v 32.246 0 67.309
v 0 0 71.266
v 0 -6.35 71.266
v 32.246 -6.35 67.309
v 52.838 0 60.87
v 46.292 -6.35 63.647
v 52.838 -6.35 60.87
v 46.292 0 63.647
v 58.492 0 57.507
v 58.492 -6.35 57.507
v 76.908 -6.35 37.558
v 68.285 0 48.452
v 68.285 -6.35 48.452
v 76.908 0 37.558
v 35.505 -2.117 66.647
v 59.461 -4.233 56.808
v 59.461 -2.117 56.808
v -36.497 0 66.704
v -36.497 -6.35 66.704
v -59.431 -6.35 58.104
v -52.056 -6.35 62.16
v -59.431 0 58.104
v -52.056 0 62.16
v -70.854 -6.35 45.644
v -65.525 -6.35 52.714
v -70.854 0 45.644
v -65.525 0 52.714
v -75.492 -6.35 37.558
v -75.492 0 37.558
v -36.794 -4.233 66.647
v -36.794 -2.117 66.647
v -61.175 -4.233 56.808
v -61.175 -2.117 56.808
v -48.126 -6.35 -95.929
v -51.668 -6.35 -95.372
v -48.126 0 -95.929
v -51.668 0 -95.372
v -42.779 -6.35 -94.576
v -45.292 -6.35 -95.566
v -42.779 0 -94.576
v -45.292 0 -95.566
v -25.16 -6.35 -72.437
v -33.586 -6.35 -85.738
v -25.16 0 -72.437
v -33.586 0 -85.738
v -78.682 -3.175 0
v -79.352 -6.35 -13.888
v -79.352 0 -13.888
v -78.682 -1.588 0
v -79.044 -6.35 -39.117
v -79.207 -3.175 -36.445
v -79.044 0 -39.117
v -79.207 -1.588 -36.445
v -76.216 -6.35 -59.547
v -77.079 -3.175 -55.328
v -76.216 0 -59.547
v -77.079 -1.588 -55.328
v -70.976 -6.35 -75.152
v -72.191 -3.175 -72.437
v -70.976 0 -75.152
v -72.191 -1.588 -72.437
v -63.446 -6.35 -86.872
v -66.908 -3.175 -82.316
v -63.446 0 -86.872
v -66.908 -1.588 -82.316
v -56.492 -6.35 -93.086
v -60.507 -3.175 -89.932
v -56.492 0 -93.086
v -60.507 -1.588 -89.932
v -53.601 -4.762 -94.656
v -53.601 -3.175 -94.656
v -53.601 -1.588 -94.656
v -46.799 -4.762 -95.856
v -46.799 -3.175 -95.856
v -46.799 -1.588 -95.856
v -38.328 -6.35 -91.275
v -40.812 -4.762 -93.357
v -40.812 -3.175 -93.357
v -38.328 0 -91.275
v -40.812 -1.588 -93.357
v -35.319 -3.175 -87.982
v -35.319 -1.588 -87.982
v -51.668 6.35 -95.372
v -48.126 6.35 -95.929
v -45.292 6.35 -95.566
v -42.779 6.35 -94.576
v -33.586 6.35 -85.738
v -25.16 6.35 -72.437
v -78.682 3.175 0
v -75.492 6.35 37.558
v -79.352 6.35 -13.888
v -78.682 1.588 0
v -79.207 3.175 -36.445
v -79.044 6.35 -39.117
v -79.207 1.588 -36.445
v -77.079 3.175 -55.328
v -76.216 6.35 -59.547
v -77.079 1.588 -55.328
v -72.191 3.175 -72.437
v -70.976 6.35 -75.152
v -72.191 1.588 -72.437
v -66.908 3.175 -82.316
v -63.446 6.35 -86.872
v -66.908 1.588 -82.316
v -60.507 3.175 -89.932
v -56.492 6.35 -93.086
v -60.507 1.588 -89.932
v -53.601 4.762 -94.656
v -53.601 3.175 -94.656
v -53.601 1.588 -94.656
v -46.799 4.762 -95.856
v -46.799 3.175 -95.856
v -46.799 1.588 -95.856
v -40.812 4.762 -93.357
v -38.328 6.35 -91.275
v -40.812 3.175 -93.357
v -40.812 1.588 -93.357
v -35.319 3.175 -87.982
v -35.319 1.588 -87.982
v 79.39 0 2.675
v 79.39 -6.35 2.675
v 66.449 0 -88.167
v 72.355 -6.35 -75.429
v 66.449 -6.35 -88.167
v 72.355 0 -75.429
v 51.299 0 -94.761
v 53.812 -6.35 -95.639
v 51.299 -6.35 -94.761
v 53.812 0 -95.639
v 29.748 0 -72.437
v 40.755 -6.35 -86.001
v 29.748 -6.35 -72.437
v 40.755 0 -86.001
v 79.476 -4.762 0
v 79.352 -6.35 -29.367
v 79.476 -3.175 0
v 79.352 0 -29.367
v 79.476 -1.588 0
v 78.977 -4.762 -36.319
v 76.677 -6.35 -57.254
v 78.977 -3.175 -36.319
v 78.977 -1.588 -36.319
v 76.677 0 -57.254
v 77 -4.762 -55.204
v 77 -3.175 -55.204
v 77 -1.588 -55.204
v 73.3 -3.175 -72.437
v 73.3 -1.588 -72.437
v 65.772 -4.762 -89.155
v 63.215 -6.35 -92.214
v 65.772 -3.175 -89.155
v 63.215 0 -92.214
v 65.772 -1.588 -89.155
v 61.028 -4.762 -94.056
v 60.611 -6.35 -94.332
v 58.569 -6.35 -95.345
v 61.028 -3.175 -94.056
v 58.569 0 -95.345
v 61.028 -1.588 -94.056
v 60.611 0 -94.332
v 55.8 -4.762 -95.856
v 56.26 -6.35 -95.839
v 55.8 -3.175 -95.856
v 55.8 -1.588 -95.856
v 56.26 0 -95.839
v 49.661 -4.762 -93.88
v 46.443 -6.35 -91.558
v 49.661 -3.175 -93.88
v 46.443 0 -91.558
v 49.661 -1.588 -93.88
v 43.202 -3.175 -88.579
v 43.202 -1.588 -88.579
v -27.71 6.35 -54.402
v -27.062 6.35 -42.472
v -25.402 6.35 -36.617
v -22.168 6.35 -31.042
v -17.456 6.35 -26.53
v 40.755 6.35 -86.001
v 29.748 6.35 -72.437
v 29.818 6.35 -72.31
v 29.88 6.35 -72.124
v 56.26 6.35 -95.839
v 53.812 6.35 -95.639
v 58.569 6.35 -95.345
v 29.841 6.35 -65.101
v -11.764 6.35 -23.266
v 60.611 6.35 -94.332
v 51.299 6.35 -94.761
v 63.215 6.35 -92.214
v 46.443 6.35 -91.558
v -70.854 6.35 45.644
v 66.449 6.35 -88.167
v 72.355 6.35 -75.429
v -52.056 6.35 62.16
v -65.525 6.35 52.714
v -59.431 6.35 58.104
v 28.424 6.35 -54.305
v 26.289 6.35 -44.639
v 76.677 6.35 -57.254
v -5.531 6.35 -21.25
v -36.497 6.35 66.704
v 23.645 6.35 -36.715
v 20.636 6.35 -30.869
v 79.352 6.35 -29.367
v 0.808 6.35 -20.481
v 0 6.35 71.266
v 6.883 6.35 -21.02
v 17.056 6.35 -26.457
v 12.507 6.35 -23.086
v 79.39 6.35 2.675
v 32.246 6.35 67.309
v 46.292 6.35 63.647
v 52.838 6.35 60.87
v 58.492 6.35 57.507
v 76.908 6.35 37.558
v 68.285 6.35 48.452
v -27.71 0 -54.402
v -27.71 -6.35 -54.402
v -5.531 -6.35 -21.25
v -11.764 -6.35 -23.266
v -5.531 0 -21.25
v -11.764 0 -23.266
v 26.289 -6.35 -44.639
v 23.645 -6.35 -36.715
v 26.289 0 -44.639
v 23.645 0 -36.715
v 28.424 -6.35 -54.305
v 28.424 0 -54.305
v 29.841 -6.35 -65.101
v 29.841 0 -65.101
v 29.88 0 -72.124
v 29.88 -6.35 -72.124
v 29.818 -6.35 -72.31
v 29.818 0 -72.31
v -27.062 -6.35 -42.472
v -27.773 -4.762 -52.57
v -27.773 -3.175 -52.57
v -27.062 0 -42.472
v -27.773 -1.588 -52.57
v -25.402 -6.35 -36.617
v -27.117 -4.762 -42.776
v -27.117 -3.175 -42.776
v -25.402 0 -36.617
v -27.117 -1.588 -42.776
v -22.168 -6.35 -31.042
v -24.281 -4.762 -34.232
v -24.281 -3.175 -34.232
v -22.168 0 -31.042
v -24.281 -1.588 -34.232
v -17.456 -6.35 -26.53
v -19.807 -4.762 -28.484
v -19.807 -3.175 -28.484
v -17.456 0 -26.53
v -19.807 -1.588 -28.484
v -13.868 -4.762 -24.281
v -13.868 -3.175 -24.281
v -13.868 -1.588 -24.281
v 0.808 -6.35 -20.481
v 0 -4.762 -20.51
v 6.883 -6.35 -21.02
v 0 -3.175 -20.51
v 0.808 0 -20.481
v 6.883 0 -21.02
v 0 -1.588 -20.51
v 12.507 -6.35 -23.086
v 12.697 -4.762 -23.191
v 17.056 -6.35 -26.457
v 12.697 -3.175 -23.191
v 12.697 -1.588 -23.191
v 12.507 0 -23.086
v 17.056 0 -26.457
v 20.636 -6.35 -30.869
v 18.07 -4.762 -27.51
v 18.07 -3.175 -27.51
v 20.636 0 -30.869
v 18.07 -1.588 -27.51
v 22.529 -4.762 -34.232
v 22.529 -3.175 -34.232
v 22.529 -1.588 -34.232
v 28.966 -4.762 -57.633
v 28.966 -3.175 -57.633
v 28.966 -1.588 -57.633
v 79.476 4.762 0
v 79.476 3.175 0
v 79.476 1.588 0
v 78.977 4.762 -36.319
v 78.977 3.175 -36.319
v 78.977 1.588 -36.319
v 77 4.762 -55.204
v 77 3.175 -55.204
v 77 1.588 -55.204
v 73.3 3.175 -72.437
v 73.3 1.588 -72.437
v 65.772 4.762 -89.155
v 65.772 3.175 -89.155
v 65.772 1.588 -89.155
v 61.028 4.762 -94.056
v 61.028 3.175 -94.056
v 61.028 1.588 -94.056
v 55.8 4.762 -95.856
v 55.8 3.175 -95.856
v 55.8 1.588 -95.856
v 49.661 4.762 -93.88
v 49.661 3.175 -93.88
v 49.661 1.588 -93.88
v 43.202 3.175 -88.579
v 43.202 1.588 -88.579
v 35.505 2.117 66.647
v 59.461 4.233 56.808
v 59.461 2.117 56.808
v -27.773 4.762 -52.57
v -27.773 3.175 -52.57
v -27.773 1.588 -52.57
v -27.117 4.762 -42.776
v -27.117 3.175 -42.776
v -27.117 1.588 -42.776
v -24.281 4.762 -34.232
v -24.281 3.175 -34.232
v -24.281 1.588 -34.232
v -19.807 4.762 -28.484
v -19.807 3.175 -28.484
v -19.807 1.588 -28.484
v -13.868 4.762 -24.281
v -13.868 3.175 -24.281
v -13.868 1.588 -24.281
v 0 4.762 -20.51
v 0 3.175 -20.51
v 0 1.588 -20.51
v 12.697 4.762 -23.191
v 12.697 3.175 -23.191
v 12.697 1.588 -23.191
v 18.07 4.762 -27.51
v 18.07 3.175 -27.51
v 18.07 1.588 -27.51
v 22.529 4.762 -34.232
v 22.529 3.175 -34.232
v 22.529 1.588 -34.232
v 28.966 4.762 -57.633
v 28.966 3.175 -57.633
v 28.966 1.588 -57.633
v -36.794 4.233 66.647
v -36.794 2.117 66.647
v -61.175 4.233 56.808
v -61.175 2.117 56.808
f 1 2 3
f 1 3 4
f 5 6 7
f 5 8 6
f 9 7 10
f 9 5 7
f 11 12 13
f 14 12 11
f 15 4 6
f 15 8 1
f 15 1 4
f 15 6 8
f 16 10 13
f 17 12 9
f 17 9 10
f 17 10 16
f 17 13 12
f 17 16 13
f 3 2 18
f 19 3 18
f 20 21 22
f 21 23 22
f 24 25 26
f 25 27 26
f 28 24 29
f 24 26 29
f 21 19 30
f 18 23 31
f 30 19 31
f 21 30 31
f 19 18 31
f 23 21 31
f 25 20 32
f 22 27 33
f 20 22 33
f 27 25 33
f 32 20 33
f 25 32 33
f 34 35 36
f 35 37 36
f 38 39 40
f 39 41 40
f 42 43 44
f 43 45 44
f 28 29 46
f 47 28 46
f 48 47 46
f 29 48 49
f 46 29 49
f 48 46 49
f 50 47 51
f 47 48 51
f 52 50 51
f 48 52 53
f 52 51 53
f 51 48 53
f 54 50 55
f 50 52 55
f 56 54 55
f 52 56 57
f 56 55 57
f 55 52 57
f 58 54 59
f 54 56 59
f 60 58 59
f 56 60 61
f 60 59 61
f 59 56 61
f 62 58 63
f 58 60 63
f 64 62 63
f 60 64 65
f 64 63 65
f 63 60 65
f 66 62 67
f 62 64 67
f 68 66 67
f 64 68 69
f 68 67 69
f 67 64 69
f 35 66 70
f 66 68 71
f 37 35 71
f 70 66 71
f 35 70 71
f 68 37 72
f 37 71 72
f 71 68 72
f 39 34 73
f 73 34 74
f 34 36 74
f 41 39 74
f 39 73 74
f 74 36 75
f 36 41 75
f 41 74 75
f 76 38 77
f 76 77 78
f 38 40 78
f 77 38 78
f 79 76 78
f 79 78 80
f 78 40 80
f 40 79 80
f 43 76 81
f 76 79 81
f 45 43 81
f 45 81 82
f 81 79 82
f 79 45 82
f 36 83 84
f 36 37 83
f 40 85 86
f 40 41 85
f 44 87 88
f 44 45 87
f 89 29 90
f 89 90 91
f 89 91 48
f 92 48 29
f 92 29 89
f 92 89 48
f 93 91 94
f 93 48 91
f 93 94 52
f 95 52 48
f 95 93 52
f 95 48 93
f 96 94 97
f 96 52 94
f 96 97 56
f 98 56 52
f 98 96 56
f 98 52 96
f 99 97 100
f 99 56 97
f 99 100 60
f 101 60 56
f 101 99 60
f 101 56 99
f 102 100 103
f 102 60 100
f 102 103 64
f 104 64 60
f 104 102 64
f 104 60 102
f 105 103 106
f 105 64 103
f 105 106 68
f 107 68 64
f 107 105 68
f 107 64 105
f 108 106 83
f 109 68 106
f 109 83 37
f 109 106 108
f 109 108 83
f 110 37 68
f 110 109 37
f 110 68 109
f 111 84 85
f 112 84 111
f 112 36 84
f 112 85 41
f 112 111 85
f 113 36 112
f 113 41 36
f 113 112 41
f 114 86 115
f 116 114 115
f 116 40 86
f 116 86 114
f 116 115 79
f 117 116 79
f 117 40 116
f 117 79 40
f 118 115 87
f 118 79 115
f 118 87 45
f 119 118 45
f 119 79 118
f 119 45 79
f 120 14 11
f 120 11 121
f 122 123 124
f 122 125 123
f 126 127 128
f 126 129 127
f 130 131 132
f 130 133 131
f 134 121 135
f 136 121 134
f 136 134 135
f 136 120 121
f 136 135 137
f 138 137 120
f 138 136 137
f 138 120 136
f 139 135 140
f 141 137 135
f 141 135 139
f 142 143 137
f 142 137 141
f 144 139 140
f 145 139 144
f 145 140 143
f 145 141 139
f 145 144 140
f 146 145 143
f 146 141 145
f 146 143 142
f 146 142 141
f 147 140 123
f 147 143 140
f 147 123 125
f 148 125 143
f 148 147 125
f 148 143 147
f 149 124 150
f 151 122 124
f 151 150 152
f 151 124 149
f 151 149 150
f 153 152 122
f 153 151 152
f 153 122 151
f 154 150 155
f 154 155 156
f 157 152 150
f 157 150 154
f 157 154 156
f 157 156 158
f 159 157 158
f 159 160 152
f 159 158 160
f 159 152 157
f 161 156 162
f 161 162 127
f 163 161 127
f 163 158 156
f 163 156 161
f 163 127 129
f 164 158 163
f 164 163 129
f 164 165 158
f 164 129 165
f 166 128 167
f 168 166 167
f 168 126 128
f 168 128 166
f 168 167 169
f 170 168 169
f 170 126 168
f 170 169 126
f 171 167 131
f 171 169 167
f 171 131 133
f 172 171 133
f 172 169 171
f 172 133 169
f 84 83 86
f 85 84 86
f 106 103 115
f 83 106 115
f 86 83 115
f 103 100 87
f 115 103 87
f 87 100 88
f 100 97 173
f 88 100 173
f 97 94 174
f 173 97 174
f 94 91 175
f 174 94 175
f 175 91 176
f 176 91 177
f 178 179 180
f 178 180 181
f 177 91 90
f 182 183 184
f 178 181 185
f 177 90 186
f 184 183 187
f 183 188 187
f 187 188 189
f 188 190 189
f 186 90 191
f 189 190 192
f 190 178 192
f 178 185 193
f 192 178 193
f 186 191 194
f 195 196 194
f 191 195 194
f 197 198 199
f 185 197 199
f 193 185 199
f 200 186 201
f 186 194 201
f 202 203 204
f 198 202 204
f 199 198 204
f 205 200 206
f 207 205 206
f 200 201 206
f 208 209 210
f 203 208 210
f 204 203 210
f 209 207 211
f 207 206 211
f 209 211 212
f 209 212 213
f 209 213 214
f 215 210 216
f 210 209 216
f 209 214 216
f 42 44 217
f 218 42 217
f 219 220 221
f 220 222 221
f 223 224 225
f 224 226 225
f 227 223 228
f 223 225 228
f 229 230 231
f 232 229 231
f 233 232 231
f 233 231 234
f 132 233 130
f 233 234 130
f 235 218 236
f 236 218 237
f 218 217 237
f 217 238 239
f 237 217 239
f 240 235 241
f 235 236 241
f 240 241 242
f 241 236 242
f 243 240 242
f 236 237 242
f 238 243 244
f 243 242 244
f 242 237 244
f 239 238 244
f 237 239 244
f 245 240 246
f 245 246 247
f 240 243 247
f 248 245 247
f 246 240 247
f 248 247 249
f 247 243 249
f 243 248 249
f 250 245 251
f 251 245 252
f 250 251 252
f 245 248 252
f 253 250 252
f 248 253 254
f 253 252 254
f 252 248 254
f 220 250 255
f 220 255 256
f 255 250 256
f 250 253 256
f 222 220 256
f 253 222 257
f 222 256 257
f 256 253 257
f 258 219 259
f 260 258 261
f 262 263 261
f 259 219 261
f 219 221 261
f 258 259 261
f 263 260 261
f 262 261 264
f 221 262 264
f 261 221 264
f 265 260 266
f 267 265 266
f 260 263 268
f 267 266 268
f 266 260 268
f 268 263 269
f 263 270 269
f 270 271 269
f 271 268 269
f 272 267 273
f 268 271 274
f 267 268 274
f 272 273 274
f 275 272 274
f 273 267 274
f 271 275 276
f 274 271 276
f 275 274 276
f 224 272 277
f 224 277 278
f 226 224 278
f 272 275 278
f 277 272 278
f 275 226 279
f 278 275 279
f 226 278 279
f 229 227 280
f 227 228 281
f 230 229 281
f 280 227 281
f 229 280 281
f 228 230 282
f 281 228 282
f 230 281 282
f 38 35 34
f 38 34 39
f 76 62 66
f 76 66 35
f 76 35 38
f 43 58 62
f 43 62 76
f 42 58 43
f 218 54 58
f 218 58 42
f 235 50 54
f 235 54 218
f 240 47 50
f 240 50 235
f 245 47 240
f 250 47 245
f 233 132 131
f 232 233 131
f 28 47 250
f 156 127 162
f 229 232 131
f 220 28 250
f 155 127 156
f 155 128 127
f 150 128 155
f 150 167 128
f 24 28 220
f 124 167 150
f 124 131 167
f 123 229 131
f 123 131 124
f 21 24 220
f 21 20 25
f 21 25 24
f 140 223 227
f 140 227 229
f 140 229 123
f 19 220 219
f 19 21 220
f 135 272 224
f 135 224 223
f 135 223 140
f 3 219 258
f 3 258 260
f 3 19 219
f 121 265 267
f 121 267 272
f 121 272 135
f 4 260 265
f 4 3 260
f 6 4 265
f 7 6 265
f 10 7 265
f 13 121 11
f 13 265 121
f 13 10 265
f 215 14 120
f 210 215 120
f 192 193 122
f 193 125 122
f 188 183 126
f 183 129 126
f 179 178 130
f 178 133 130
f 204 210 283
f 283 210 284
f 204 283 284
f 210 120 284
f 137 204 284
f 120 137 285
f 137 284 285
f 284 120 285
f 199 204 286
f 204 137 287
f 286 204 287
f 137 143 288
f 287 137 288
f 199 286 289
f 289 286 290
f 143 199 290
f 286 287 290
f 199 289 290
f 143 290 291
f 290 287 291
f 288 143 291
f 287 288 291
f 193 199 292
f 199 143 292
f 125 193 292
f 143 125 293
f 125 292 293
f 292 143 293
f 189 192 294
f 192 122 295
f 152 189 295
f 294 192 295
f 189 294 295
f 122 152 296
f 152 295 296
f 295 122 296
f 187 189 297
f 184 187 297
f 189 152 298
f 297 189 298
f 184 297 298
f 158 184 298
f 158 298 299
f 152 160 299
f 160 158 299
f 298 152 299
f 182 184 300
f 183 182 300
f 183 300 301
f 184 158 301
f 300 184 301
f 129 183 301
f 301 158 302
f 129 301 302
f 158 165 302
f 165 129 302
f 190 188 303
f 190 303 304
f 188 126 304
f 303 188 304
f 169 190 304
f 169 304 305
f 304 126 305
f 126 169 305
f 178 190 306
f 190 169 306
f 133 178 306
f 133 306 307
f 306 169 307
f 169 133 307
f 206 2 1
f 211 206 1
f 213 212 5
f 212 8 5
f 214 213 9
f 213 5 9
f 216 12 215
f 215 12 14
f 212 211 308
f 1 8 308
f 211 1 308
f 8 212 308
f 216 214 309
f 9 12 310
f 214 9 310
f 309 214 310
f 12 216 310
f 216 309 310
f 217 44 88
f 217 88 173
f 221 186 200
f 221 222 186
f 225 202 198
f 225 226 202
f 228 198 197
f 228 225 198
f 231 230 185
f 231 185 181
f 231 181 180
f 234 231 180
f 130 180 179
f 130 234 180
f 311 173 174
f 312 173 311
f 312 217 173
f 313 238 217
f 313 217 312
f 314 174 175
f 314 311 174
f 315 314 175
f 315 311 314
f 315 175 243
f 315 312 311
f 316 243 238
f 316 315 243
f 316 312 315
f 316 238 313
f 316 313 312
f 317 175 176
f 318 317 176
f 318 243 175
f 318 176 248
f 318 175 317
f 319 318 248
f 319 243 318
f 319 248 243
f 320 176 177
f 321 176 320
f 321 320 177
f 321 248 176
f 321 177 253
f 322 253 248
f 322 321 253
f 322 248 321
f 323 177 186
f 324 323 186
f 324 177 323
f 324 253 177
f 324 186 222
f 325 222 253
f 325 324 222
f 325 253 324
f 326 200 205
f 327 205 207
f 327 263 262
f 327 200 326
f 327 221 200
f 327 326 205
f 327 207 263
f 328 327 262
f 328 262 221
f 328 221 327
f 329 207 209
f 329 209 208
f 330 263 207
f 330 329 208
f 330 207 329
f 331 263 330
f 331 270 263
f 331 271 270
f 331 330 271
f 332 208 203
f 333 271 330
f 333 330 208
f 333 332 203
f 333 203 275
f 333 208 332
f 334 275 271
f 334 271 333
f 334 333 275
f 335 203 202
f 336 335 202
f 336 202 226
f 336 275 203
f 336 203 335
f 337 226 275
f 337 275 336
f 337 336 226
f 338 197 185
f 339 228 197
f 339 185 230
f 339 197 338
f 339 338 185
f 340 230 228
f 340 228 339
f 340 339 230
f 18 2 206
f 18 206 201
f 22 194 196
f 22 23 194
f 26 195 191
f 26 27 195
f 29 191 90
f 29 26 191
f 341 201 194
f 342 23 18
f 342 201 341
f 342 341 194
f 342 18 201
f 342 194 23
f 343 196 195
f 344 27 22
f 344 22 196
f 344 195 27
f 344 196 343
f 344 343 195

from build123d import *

# Parameters (mm, degrees)
F1_DEPTH = 6.35


with BuildPart() as f1:
    # F0 (on Front) → F1 (new body, symmetric)
    with BuildSketch(Plane.XZ):
        with BuildLine():
            add(Edge.make_bspline(
                [(-75.4921287298, 37.5578589737), (-76.6170850867, 26.516359751), (-79.3046661768, 0.1376257352), (-81.593561187, -72.25420499), (-45.3096589694, -106.5408329997), (-31.7861264568, -83.652591086), (-25.1596532762, -72.4374502897)],
                knots=[0, 0, 0, 0, 0.2344061229, 0.5600088033, 0.7844061926, 1, 1, 1, 1], degree=3))
            add(Edge.make_bspline(
                [(-25.1596532762, -72.4374502897), (-27.77456204, -60.2224833855), (-31.541583875, -30.8955744763), (0.6279793592, -16.5131330508), (27.2473390153, -27.7253136549), (30.9129416013, -70.9050207805), (29.7484043986, -72.4374502897)],
                knots=[0, 0, 0, 0, 0.2631781381, 0.4880065616, 0.7066611501, 0.9721223261, 0.9721223261, 0.9721223261, 0.9721223261], degree=3))
            add(Edge.make_bspline(
                [(76.9078712702, 37.5578589737), (77.9651395469, 26.49012432), (80.4916599964, 0.041910043), (79.2329421017, -70.1974133528), (56.1577827004, -106.6605096403), (38.8127355164, -84.1836238753), (29.7484043986, -72.4374502897)],
                knots=[0, 0, 0, 0, 0.2360967112, 0.5641928183, 0.7722519543, 1, 1, 1, 1], degree=3))
            add(Edge.make_bspline(
                [(0, 71.2657347322), (12.3528519136, 70.1268204318), (35.2113913621, 68.0192975987), (60.8258622585, 58.9292038504), (71.5443535326, 44.685425389), (76.9078712702, 37.5578589737)],
                knots=[0, 0, 0, 0, 0.3700564934, 0.6847771683, 1, 1, 1, 1], degree=3))
            add(Edge.make_bspline(
                [(0, 71.2657347322), (-12.6942690053, 69.4932034843), (-36.2570772434, 68.2779147784), (-62.8741972953, 59.0881116504), (-71.4880085988, 45.15374106), (-75.4921287298, 37.5578589737)],
                knots=[0, 0, 0, 0, 0.3778789493, 0.696061045, 1, 1, 1, 1], degree=3))
        make_face()
    extrude(amount=F1_DEPTH, both=True)


solid = f1.part
